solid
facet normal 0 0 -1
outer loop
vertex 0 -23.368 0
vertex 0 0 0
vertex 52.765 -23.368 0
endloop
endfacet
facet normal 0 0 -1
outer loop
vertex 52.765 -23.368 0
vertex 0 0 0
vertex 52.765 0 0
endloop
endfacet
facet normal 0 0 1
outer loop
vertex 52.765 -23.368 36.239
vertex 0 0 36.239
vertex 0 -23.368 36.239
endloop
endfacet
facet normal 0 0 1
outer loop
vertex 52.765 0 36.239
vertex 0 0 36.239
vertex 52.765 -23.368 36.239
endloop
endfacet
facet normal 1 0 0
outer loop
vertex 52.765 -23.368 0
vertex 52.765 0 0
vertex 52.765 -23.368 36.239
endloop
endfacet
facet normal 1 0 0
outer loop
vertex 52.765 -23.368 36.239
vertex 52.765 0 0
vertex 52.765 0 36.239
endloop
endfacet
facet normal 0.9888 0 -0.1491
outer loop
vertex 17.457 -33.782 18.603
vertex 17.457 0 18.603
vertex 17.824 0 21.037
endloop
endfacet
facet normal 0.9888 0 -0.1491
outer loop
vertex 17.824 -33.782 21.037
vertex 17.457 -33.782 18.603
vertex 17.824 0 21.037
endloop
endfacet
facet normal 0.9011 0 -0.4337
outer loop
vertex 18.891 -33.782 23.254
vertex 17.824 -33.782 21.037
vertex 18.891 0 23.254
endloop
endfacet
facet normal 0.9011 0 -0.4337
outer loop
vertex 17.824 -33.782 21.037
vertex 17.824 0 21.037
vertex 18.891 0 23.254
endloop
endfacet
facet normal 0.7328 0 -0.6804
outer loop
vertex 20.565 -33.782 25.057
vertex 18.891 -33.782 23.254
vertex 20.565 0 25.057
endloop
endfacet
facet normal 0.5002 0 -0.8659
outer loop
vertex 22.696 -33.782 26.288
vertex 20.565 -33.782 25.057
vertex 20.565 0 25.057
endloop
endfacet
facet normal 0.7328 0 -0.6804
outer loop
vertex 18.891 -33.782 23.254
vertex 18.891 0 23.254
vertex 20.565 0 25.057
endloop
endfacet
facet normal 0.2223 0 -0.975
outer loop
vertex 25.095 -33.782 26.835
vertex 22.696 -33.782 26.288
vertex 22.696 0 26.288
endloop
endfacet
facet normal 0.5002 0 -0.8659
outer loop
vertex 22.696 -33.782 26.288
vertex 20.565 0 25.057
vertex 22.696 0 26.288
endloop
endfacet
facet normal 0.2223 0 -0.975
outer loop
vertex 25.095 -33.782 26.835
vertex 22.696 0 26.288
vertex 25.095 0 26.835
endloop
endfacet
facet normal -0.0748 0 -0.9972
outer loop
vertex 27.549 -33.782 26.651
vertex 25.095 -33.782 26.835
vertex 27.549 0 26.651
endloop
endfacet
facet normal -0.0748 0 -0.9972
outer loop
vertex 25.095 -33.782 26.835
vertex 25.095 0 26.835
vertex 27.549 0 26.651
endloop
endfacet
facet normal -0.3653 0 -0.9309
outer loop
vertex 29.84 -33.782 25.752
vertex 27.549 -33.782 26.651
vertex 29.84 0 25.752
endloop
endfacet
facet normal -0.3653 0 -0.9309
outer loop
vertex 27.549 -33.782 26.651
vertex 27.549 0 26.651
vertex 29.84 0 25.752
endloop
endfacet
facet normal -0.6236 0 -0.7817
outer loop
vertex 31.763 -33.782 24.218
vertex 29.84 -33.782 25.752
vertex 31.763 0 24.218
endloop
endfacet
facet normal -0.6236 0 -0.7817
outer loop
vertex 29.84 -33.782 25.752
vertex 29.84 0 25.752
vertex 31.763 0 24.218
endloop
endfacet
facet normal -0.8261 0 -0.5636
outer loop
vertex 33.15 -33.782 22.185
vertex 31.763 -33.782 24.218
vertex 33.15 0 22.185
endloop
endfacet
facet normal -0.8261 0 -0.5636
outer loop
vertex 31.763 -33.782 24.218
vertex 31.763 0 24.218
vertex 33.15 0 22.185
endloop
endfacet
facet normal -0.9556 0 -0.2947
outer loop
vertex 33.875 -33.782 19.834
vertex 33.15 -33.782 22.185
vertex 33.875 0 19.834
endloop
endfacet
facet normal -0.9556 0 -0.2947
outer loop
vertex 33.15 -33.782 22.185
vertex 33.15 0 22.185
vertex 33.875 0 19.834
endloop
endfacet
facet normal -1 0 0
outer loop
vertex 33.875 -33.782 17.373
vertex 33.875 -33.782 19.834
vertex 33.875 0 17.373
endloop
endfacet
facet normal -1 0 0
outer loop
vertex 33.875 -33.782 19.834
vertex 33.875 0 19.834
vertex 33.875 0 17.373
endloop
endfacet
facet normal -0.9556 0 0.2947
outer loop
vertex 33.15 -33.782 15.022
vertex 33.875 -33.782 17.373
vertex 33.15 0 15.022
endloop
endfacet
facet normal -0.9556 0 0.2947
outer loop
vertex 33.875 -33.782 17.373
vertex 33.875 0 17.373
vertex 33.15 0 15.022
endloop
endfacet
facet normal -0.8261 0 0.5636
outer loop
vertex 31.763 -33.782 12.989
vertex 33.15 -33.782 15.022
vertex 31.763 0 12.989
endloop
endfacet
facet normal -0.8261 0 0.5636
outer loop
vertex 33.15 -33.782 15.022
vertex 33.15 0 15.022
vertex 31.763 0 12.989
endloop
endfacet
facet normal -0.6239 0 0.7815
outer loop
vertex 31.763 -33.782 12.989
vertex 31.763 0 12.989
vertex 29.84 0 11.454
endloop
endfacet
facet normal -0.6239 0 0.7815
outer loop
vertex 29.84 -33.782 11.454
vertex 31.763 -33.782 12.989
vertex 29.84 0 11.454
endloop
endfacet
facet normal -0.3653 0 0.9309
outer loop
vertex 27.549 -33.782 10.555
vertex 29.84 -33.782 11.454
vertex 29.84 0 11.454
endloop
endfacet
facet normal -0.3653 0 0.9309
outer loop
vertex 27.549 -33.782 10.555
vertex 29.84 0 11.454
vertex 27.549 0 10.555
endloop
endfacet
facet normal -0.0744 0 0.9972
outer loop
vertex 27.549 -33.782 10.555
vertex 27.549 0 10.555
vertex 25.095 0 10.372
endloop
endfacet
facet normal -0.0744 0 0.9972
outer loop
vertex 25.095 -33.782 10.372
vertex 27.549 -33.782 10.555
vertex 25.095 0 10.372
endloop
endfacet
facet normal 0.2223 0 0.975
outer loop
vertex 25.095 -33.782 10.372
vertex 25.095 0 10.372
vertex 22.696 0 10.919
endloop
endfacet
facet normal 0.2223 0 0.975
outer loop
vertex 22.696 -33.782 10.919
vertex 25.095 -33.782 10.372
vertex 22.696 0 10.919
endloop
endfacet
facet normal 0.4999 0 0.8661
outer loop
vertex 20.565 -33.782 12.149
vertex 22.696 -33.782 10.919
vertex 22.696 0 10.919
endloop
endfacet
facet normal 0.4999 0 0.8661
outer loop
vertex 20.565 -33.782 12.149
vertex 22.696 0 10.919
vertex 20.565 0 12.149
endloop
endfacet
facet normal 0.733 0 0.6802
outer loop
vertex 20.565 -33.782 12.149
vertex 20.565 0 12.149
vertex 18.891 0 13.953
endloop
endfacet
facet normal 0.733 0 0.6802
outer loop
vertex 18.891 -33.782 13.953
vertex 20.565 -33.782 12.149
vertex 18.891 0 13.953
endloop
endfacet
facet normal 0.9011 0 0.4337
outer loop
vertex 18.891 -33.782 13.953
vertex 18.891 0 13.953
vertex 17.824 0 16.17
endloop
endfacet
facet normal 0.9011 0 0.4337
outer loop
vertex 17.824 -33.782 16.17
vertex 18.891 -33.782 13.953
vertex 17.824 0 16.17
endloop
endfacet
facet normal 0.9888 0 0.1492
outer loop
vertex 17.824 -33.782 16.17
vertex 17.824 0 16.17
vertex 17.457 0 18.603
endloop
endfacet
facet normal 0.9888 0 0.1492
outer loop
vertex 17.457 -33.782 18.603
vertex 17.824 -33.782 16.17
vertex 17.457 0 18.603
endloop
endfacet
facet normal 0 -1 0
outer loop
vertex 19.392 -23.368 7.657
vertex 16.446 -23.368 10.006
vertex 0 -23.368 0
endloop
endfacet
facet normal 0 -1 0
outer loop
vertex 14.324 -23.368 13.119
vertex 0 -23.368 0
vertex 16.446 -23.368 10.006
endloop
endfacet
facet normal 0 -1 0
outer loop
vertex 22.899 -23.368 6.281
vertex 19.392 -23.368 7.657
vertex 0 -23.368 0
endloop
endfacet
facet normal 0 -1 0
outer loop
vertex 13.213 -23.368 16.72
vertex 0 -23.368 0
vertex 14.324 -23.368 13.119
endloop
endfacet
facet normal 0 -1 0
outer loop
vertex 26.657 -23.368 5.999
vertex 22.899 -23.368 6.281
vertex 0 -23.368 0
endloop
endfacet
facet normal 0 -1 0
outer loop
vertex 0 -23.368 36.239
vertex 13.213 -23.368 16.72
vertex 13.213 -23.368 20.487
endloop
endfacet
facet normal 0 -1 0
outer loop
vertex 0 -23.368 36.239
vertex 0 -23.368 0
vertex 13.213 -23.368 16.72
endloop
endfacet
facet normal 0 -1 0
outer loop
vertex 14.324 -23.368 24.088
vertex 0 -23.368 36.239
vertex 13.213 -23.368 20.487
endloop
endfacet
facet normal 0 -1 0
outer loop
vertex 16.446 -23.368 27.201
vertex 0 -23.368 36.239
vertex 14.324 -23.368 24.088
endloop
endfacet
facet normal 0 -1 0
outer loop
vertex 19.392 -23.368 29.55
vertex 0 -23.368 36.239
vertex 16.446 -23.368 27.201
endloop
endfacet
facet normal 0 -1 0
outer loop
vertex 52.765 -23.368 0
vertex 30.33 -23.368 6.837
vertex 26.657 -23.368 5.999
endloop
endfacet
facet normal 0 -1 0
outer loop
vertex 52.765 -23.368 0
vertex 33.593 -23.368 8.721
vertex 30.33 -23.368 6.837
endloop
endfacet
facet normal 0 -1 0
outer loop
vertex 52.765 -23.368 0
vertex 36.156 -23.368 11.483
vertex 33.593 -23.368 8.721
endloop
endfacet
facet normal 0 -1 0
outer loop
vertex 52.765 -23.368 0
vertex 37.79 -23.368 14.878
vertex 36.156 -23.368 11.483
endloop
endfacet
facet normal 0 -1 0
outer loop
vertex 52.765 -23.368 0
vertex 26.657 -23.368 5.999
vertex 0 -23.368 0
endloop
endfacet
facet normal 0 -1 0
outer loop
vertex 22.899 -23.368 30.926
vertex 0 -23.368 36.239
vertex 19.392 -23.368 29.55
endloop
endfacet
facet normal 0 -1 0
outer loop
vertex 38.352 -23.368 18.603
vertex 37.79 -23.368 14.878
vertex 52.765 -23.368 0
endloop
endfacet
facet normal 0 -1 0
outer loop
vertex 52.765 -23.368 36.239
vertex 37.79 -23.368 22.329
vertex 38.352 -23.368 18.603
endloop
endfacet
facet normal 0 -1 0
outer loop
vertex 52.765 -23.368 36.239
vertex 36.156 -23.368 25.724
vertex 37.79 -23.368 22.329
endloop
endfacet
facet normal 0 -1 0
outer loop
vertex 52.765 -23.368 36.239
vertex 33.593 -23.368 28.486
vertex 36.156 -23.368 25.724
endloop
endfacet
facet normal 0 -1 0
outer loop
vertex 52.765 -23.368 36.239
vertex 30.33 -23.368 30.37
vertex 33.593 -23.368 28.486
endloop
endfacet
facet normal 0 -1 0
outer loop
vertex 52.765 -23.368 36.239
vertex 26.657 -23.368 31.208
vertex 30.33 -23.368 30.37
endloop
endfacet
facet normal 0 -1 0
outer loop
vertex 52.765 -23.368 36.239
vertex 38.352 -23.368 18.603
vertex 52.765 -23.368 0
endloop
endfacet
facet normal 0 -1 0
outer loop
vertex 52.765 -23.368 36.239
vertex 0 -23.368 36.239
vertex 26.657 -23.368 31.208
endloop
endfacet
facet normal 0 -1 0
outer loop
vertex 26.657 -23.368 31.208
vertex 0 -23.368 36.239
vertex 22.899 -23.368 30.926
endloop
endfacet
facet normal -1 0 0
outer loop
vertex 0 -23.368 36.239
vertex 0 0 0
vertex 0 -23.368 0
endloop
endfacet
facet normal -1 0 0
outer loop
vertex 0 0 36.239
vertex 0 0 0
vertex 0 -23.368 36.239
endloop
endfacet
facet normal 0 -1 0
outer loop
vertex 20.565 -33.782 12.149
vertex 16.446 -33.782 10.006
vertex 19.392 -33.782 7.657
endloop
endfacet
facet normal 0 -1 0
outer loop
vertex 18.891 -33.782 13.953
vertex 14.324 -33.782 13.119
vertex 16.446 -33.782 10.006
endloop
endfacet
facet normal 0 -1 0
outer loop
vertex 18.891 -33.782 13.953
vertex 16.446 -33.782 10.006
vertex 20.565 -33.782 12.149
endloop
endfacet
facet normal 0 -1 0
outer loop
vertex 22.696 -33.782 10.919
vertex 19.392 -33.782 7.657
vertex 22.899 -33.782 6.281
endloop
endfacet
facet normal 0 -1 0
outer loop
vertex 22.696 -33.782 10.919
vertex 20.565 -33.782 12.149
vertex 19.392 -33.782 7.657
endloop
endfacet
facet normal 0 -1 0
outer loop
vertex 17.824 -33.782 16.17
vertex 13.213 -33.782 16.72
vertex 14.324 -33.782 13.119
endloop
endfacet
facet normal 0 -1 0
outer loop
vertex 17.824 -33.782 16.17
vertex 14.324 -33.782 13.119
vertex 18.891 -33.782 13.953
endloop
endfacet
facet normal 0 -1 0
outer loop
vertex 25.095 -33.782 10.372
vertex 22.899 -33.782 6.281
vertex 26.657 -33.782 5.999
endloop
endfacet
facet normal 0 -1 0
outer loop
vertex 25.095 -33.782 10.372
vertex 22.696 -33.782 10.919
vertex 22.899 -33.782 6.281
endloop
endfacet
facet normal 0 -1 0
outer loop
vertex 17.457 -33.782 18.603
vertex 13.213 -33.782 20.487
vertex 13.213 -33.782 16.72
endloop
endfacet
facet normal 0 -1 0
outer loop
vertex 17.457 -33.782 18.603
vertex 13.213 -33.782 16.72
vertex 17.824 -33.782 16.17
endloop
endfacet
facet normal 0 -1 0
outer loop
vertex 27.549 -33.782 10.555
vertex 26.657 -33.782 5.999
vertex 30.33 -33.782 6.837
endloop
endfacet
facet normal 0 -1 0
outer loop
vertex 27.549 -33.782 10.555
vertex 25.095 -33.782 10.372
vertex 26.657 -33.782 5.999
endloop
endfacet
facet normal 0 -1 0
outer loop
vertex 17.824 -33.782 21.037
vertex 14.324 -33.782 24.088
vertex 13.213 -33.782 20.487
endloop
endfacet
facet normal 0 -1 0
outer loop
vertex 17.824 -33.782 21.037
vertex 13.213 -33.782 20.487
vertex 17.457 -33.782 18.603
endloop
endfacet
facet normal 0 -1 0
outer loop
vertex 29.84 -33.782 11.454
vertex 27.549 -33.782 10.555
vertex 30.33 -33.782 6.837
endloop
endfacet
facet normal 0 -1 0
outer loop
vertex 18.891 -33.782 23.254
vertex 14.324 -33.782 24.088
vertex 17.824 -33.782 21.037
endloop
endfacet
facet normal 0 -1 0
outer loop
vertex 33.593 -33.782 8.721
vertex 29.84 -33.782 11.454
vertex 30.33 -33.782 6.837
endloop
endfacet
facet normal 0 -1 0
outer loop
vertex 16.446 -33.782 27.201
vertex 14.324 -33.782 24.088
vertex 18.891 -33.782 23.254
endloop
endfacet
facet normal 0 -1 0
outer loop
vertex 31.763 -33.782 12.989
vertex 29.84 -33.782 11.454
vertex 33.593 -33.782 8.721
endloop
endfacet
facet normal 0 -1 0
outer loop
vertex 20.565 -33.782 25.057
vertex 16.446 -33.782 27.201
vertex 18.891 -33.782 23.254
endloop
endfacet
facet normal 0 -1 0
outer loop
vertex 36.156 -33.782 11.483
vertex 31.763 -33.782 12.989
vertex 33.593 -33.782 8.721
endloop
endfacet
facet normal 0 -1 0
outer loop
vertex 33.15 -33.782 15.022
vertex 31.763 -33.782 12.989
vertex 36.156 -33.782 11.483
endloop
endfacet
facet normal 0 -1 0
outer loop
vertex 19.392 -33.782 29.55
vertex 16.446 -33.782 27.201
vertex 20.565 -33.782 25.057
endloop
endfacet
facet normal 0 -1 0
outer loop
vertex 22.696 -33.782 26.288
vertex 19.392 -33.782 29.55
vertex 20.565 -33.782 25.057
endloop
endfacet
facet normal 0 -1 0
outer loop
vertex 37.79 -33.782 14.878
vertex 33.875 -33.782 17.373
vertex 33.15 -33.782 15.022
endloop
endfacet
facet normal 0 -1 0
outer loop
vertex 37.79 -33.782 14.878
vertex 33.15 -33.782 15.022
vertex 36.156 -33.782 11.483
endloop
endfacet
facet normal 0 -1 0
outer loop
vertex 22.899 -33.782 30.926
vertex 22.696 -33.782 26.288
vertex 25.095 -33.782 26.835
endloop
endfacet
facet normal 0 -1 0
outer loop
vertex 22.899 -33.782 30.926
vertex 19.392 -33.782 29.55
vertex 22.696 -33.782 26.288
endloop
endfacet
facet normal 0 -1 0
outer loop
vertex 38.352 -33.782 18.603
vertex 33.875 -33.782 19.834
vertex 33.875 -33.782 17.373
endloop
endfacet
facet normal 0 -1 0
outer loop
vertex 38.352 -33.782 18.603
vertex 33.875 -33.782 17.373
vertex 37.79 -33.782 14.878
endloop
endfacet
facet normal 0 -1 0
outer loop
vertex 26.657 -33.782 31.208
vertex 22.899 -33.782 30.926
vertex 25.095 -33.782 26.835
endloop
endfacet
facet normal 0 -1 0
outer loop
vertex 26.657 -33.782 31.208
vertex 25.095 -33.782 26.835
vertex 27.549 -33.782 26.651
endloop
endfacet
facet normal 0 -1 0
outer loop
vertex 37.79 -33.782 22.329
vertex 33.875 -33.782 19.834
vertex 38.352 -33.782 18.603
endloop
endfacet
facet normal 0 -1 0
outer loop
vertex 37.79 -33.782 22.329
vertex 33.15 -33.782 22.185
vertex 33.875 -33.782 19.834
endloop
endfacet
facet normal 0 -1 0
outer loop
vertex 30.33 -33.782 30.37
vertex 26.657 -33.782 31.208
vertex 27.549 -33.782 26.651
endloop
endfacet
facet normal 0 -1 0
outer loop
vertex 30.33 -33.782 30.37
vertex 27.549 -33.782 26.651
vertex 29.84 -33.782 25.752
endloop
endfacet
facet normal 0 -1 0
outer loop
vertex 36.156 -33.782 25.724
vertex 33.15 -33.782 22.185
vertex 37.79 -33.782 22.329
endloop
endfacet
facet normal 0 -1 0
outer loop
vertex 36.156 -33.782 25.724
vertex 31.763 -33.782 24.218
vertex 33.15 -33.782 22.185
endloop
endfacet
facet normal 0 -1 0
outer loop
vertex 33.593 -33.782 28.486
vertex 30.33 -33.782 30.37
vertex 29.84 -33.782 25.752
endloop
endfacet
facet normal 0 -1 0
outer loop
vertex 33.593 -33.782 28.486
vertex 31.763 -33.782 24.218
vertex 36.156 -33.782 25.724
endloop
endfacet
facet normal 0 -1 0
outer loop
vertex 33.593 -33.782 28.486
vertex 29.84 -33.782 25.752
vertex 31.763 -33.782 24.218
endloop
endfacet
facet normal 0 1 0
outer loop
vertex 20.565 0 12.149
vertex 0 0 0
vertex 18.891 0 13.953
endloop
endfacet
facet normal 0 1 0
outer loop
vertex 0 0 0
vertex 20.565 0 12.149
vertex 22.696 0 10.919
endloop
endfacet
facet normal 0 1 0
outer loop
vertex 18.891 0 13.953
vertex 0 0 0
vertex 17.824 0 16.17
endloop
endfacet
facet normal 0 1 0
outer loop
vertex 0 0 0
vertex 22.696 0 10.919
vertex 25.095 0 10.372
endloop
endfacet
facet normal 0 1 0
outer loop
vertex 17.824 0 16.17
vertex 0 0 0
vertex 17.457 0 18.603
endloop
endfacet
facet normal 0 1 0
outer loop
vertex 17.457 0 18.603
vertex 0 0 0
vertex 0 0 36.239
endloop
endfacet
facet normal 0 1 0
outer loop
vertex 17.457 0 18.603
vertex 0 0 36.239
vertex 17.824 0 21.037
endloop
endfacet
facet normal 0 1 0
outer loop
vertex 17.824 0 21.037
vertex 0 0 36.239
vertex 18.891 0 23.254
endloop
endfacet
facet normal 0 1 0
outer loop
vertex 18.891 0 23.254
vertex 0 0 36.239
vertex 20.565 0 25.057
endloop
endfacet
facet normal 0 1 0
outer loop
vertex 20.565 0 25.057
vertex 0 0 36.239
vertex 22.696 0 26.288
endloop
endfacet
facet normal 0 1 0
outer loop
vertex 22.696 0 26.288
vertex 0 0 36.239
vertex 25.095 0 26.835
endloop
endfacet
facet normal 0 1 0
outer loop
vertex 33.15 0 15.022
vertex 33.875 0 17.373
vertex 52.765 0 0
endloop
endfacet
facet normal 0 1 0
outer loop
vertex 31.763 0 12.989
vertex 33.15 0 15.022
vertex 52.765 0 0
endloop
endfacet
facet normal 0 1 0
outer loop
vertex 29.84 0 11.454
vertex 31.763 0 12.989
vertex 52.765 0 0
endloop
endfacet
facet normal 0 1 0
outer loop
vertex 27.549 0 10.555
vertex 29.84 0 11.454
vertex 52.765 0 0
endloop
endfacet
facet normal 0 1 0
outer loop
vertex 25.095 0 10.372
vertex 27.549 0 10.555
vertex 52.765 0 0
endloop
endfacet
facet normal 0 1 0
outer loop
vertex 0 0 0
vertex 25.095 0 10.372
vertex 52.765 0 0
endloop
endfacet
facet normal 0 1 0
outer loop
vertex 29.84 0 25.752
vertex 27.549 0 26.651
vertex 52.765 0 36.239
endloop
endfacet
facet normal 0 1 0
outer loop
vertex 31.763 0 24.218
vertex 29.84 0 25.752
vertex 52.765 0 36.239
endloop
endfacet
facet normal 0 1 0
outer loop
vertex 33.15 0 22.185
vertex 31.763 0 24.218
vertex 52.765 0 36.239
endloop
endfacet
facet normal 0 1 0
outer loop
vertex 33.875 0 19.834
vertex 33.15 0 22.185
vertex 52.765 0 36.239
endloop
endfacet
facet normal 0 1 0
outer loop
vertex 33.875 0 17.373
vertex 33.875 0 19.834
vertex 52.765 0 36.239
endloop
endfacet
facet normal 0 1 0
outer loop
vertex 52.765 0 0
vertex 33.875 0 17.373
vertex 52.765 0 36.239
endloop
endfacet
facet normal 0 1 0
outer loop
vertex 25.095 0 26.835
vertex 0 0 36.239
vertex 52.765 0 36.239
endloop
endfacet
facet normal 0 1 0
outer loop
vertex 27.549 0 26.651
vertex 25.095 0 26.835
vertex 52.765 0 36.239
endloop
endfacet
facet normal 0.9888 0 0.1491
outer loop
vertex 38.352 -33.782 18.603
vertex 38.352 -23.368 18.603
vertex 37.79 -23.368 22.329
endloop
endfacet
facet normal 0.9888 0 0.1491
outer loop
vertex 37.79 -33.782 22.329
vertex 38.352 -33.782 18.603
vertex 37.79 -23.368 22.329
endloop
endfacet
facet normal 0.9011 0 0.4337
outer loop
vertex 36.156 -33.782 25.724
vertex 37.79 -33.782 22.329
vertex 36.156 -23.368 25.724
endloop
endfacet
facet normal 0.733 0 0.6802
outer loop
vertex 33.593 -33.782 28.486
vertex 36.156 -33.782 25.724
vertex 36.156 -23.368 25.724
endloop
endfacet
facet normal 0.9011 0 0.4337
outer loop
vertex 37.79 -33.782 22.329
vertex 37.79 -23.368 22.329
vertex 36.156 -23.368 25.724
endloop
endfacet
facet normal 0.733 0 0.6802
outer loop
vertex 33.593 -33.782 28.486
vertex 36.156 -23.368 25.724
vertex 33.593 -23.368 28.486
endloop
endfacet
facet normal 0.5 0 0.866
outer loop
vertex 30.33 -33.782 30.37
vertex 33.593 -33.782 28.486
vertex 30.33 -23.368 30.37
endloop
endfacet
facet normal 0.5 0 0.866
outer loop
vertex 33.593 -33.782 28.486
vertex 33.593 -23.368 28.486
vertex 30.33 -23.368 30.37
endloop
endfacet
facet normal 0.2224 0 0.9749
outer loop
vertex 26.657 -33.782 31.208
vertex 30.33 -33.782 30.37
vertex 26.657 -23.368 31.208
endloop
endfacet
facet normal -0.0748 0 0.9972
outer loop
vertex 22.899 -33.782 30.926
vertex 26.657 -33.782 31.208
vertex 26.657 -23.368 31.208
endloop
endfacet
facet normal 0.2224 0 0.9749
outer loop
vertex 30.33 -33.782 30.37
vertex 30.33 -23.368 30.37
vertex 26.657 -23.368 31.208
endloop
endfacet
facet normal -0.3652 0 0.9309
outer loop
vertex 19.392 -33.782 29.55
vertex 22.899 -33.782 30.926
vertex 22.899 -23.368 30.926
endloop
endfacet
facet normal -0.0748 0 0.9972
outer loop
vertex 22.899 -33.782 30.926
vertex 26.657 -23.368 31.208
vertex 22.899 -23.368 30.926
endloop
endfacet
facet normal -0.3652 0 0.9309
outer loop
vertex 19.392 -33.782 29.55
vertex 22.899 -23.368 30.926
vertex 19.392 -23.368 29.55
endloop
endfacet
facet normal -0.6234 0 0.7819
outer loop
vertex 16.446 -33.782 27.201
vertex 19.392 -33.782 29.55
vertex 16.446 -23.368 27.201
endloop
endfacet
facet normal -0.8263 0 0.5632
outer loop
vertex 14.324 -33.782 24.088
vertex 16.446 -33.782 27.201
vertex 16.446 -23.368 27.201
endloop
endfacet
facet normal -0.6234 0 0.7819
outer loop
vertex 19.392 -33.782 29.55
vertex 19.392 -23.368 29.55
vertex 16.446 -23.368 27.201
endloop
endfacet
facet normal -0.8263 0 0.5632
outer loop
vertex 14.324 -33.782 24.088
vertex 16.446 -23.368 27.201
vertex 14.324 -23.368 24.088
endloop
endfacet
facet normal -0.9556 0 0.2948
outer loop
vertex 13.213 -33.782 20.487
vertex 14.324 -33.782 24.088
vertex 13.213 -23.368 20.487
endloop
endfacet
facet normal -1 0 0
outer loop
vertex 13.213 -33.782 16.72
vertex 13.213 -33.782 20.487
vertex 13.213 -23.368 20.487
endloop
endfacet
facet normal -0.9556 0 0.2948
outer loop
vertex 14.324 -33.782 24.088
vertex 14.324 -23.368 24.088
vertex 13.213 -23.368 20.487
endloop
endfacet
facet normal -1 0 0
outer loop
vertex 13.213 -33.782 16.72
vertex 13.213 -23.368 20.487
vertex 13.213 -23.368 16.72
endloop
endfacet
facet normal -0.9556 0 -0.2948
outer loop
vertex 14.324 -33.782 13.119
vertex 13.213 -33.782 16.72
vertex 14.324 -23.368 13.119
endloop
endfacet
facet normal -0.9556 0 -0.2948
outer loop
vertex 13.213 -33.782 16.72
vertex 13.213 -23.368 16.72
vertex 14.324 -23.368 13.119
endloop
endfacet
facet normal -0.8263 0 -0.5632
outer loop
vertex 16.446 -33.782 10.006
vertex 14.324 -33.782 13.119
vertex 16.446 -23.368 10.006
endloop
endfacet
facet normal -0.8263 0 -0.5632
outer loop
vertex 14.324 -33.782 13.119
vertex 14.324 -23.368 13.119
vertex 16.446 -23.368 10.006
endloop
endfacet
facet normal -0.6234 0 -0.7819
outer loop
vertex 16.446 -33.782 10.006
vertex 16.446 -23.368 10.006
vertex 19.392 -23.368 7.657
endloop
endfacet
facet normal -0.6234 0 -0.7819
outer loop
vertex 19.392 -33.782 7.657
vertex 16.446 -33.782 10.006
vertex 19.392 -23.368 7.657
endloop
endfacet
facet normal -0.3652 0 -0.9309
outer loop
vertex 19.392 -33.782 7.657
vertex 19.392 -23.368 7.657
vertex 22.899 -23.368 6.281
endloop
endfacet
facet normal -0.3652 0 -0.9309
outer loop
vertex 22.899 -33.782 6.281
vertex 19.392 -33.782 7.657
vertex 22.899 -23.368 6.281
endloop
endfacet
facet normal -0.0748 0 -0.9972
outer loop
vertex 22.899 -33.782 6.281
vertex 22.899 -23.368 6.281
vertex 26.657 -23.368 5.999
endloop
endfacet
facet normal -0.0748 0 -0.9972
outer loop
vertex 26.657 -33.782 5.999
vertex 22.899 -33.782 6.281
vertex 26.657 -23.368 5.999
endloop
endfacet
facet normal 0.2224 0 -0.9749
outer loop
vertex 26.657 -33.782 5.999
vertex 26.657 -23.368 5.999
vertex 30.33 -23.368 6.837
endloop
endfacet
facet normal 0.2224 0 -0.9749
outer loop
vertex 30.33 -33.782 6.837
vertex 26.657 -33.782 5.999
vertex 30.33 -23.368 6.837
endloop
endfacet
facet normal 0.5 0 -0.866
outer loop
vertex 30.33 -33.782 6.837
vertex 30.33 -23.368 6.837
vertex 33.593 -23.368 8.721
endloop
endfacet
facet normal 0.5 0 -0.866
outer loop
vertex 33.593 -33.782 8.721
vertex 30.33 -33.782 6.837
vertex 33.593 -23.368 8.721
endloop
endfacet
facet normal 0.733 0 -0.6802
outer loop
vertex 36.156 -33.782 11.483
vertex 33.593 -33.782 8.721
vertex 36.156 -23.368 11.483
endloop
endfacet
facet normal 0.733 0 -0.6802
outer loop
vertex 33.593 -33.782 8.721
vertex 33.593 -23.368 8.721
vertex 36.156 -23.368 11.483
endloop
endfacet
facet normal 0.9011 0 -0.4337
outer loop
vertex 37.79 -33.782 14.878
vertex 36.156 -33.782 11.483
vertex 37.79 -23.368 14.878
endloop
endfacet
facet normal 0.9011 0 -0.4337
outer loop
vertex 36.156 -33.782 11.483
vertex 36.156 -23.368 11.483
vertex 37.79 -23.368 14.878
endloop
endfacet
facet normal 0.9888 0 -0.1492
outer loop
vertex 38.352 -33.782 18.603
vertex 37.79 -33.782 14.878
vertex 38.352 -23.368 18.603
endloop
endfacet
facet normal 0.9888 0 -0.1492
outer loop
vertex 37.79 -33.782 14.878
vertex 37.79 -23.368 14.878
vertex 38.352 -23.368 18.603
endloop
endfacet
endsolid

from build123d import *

# Parameters (mm, degrees)
F0_W     = 52.765369
F0_H     = 36.238667
F1_DEPTH = 23.368
F2_R     = 12.639817
F3_DEPTH = 10.414
F5_D     = 16.51


with BuildPart() as f1:
    # F0 (on Front) → F1 (new body)
    with BuildSketch(Plane.XZ):
        with Locations((26.382684, 18.119333)):
            Rectangle(F0_W, F0_H)
    extrude(amount=F1_DEPTH)

    # F2 (on face) → F3 (join)
    with BuildSketch(Plane.XZ.offset(23.368)):
        with Locations((25.712097, 18.603459)):
            Circle(F2_R)
    extrude(amount=F3_DEPTH)

    # F5 (through all)
    with Locations(Plane.XZ.offset(33.782)):
        with Locations((25.712097, 18.603459)):
            Hole(F5_D / 2)


solid = f1.part
